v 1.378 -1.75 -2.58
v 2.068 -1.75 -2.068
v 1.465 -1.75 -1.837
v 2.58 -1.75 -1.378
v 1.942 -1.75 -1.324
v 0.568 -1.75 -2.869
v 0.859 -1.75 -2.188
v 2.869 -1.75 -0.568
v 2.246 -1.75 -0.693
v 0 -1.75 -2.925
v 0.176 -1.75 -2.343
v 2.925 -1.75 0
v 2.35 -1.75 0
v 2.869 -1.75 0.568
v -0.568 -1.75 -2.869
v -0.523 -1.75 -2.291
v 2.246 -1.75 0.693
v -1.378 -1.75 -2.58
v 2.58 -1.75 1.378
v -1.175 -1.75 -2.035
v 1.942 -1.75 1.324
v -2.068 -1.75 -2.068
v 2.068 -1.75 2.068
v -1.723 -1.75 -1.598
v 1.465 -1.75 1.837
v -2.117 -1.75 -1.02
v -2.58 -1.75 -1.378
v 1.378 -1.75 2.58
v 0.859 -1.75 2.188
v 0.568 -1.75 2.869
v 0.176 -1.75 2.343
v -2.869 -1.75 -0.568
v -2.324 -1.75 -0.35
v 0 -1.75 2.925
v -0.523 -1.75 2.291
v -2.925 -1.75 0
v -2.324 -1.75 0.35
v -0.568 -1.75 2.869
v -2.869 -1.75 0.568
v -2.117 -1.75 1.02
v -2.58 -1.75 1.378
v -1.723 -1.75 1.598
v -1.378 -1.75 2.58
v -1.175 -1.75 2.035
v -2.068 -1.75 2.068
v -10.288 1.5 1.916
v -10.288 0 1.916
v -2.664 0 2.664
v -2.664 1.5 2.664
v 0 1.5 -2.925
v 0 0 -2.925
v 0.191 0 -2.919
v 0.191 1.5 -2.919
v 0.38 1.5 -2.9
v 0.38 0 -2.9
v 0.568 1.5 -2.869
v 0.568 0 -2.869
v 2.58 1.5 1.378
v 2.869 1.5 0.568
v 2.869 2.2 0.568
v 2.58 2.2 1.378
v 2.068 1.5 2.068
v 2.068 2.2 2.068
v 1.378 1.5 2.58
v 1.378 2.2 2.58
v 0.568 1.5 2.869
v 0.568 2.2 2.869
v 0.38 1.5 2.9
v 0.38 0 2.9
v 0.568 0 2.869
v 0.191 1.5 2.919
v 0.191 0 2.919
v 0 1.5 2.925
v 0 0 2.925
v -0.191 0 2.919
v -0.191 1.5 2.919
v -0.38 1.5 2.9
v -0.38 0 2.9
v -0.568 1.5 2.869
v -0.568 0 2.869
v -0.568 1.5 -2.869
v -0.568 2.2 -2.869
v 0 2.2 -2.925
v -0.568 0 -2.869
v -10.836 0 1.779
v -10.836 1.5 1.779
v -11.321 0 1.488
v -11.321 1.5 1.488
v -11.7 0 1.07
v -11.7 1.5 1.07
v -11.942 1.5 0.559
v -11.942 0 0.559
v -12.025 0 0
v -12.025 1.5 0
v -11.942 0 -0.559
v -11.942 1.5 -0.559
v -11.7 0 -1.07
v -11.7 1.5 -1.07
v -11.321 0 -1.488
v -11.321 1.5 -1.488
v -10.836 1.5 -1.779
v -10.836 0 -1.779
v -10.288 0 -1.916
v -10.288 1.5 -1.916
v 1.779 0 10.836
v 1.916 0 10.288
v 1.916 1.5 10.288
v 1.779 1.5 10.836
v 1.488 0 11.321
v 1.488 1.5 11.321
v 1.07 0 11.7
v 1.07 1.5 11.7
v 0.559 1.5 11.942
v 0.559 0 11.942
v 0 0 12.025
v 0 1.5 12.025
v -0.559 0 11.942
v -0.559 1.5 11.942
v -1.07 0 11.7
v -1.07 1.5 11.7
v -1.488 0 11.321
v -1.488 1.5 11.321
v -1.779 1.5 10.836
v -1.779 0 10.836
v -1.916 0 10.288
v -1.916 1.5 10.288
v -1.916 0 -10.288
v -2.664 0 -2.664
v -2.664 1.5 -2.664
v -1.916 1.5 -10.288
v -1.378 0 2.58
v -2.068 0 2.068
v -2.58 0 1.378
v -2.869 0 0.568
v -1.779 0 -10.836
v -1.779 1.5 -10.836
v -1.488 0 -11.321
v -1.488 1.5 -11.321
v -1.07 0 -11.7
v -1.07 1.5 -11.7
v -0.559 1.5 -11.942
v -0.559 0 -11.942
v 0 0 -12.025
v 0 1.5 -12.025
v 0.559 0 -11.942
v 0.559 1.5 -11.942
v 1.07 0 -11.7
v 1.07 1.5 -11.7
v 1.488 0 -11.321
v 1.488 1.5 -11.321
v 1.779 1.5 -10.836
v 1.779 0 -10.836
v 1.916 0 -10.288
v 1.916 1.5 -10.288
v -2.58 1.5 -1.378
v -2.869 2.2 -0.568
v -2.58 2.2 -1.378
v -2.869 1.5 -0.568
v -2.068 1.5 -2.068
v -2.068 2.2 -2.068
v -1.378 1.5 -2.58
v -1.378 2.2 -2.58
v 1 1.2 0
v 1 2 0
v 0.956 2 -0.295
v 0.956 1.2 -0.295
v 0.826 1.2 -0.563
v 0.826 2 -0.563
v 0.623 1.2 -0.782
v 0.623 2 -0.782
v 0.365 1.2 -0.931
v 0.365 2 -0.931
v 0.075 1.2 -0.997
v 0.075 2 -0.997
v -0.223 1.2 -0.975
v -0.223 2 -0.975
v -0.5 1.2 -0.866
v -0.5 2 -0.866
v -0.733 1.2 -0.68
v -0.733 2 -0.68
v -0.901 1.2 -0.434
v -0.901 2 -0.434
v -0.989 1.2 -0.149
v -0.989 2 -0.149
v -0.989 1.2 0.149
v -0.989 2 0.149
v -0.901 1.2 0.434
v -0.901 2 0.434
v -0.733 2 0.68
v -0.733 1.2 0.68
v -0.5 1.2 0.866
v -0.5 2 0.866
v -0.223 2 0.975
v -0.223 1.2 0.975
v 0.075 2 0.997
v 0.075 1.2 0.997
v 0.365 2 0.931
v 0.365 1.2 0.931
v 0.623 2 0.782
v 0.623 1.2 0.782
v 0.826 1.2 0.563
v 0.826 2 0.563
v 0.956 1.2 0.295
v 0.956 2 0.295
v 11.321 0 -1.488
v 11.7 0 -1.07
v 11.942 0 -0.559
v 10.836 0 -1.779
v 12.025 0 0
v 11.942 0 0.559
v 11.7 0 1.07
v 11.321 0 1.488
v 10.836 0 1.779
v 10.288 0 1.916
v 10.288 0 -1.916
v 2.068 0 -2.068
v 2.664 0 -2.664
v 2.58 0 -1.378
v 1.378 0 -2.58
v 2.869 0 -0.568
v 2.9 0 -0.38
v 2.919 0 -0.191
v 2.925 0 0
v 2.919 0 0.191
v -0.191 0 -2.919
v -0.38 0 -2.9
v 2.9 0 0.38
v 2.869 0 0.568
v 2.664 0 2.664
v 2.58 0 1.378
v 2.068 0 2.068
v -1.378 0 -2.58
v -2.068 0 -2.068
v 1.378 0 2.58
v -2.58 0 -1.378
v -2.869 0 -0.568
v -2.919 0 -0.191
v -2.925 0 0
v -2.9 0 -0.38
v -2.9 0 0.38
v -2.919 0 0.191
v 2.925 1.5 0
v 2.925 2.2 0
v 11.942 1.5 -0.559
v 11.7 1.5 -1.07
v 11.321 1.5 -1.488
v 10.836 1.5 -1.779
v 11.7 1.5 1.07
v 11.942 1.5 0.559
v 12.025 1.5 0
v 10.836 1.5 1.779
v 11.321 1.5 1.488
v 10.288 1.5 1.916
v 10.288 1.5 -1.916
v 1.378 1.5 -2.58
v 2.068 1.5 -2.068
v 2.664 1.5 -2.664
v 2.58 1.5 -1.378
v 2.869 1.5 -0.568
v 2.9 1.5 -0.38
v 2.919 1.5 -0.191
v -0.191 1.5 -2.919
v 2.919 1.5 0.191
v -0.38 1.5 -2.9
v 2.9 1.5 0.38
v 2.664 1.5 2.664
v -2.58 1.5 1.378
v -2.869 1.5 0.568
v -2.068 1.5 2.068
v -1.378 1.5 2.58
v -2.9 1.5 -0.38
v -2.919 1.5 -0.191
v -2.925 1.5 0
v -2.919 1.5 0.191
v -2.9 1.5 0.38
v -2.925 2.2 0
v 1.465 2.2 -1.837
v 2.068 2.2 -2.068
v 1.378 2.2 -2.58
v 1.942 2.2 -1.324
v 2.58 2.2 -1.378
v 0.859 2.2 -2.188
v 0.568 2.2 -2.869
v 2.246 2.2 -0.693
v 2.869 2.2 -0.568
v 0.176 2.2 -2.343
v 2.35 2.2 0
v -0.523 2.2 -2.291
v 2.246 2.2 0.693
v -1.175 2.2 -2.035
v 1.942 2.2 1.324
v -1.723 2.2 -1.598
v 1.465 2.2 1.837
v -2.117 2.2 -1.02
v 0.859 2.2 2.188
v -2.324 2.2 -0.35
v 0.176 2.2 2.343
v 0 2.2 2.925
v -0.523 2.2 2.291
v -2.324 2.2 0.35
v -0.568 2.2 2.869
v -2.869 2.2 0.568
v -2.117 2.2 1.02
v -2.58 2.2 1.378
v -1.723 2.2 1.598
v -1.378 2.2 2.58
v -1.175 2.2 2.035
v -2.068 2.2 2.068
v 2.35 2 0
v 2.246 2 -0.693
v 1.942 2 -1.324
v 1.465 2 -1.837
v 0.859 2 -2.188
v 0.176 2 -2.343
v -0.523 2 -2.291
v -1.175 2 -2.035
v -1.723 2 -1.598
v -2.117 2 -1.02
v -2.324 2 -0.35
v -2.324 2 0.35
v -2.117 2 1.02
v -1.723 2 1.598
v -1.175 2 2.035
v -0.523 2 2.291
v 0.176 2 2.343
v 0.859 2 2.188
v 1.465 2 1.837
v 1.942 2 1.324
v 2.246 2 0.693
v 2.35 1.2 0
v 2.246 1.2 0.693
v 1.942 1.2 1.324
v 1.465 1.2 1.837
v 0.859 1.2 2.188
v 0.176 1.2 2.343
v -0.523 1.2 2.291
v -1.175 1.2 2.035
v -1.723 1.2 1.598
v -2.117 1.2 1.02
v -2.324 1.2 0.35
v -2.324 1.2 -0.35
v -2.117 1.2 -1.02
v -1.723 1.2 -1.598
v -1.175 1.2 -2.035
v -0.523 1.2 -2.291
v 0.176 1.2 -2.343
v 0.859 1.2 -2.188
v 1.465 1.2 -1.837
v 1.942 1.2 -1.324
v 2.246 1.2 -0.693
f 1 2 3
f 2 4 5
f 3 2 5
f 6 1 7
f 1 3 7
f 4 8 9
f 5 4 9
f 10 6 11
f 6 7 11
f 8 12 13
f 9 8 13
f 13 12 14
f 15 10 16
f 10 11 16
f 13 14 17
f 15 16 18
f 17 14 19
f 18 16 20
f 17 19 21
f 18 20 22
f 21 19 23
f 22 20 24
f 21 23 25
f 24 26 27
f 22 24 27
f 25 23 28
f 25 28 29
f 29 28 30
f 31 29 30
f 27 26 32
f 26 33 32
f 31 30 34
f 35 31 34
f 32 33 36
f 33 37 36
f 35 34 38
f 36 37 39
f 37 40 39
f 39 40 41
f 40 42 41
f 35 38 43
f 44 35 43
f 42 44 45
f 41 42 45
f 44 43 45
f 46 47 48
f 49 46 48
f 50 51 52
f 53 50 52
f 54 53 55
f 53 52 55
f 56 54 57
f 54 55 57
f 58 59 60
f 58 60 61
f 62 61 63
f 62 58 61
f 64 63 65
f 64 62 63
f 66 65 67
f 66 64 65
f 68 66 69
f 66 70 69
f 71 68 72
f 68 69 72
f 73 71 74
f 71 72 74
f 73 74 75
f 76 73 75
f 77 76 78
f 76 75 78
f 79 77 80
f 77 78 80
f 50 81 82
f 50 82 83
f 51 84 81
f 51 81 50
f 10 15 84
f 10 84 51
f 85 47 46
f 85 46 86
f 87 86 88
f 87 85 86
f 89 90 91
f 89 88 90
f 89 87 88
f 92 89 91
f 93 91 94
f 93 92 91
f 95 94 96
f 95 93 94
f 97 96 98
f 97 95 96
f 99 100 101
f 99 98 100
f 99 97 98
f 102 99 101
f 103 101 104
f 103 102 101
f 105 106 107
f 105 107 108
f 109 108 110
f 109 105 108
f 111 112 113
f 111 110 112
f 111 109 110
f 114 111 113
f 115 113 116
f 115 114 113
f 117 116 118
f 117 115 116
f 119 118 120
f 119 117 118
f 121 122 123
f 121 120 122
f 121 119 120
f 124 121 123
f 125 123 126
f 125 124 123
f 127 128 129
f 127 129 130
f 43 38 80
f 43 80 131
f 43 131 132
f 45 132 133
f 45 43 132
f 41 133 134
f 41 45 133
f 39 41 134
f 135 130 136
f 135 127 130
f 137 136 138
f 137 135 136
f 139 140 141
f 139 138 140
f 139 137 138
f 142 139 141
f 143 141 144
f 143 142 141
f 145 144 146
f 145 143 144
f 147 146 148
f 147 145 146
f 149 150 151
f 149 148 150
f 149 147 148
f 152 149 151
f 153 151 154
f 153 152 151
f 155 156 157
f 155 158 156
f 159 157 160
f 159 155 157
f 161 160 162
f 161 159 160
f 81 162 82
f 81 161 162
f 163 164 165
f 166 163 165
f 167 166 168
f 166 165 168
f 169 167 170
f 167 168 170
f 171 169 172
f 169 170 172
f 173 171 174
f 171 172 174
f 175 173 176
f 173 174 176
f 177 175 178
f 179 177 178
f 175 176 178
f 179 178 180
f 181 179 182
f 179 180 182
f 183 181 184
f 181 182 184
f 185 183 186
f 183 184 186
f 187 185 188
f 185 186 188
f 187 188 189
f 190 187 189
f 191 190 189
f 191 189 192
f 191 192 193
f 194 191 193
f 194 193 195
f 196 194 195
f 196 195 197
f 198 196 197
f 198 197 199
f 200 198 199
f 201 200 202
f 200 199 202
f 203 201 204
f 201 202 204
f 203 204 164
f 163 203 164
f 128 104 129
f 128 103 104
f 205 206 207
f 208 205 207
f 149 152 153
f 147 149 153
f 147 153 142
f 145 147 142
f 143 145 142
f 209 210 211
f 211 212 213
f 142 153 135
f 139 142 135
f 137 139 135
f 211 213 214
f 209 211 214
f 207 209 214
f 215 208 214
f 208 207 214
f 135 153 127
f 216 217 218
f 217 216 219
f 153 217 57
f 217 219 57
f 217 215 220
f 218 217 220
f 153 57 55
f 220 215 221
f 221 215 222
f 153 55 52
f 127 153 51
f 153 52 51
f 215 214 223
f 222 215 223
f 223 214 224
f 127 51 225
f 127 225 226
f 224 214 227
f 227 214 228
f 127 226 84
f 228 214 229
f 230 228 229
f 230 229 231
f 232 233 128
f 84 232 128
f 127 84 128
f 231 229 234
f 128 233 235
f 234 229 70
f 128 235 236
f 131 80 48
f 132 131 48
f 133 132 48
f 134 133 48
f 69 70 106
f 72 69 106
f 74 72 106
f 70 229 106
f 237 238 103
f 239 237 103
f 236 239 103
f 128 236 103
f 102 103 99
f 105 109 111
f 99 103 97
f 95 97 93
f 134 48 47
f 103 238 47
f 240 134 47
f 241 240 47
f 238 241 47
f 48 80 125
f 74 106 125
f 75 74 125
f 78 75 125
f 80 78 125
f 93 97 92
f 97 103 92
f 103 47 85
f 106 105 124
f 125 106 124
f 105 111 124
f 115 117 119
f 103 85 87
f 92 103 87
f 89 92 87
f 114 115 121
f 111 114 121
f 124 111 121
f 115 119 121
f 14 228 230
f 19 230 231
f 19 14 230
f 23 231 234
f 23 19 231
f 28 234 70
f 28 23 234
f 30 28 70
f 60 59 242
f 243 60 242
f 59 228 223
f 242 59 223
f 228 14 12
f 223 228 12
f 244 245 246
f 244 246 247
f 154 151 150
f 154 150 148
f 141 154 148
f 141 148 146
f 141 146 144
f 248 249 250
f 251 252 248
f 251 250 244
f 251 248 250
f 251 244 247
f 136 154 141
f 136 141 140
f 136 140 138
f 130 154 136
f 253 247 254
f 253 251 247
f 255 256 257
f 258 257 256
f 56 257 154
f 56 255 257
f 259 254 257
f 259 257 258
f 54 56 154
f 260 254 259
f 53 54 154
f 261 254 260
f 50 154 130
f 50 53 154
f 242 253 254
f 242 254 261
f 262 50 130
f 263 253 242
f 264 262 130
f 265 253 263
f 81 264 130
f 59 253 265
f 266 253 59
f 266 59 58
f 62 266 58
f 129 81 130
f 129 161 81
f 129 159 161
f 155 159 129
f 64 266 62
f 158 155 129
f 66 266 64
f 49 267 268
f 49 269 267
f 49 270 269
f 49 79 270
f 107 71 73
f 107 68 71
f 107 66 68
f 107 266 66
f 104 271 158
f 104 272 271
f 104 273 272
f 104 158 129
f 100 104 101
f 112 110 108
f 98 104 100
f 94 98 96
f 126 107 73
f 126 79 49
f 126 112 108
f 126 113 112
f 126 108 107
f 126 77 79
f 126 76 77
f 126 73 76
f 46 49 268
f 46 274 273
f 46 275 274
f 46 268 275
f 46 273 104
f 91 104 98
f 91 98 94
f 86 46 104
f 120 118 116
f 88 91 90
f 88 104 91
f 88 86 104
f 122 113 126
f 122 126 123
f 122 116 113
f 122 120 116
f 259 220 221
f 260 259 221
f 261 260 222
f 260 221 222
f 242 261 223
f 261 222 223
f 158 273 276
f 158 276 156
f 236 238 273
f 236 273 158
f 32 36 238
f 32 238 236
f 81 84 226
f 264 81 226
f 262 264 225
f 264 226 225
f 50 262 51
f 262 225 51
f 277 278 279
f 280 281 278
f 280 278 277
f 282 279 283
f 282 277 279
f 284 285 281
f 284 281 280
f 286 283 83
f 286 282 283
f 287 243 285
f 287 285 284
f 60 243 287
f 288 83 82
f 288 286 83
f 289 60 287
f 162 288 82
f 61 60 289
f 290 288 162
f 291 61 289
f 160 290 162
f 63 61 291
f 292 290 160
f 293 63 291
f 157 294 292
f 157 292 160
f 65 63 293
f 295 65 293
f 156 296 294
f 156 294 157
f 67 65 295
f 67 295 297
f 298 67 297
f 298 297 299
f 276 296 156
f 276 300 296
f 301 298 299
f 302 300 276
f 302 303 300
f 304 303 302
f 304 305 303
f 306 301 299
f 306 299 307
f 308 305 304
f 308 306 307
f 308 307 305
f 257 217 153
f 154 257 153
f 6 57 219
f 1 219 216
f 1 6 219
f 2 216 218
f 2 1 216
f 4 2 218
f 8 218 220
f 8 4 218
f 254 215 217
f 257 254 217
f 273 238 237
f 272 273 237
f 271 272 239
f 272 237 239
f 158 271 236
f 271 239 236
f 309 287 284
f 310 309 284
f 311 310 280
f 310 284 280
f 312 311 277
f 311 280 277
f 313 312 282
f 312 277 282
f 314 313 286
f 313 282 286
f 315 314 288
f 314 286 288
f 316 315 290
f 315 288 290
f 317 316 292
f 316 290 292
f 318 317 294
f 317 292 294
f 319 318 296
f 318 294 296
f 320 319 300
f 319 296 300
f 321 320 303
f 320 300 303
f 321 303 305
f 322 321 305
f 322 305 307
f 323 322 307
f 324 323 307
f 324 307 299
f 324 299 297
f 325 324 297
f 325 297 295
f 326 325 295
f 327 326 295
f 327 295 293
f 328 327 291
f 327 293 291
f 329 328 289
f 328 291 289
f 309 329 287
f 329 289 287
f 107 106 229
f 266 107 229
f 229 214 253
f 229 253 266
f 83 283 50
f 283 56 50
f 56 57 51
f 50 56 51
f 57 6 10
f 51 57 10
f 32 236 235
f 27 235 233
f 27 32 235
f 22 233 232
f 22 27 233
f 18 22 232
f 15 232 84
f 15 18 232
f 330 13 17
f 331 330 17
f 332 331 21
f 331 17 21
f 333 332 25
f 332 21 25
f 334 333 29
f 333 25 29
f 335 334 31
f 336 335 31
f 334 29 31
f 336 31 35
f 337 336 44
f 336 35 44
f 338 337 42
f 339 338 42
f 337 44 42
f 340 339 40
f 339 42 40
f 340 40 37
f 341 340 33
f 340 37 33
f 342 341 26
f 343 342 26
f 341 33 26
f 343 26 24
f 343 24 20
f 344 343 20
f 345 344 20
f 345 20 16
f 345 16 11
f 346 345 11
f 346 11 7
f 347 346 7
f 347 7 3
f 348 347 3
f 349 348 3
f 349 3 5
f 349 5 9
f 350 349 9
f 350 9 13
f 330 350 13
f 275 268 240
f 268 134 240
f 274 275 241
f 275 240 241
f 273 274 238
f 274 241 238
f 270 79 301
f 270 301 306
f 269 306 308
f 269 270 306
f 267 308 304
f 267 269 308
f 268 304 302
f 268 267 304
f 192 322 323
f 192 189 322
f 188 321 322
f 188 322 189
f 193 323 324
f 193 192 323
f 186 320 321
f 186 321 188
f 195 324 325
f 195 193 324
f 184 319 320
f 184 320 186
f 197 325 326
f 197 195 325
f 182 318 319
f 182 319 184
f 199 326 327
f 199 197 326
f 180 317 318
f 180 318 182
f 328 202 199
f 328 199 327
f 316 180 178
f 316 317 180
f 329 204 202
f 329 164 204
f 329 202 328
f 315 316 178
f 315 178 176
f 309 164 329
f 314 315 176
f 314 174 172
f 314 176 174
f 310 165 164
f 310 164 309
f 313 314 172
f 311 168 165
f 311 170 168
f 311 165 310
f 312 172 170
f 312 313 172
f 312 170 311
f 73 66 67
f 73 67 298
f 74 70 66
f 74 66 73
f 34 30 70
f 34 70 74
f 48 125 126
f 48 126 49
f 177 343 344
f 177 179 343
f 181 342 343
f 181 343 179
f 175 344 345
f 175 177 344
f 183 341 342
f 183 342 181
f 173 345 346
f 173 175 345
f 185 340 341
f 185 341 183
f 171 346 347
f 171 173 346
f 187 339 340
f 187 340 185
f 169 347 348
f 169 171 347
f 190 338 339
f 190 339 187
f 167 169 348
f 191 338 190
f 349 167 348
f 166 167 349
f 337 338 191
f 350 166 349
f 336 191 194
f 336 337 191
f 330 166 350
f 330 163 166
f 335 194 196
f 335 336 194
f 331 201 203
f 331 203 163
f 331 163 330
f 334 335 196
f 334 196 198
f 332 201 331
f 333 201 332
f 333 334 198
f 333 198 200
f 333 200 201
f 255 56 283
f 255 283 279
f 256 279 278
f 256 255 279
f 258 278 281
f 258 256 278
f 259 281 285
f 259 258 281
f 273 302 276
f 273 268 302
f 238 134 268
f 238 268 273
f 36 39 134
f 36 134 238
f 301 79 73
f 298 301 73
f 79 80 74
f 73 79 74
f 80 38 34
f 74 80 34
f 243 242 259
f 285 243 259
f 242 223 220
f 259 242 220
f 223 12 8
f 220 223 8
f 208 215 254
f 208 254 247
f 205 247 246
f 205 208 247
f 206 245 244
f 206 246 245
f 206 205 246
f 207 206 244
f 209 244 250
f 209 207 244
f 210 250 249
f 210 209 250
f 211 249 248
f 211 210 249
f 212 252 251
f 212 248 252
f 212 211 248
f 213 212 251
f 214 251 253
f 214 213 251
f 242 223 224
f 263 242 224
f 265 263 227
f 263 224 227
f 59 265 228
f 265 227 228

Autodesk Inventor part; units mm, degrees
ref_plane "YZ Plane" through (0, 0, 0) normal (1, 0, 0) x (0, 1, 0)
ref_plane "XZ Plane" through (0, 0, 0) normal (0, 1, 0) x (-1, 0, 0)
ref_plane "XY Plane" through (0, 0, 0) normal (0, 0, 1) x (1, 0, 0)
sketch "Sketch1" plane through (0, 0, 0) normal (0, 1, 0) x (-1, 0, 0)
  circle A0 centre (0, 0) radius 2.925
  line L0 (0, 10.1) -> (0, -10.1) construction
  arc A1 (1.9158, 10.2879) -> (-1.9158, 10.2879) centre (0, 10.1) ccw
  arc A2 (-1.9158, -10.2879) -> (1.9158, -10.2879) centre (0, -10.1) ccw
  line L1 (10.1, 0) -> (-10.1, 0) construction
  arc A3 (10.2879, -1.9158) -> (10.2879, 1.9158) centre (10.1, 0) ccw
  arc A4 (-10.2879, 1.9158) -> (-10.2879, -1.9158) centre (-10.1, 0) ccw
  line L2 (1.9158, 10.2879) -> (2.925, 0)
  line L3 (-1.9158, 10.2879) -> (-2.925, 0)
  line L4 (-2.925, 0) -> (-1.9158, -10.2879)
  line L5 (2.925, 0) -> (1.9158, -10.2879)
  line L6 (10.2879, 1.9158) -> (0, 2.925)
  line L7 (10.2879, -1.9158) -> (0, -2.925)
  line L8 (-10.2879, 1.9158) -> (0, 2.925)
  line L9 (-10.2879, -1.9158) -> (0, -2.925)
  point P0 (2.6637, 2.6637)
  point P1 (-2.6637, 2.6637)
  point P2 (-2.6637, -2.6637)
  point P3 (2.6637, -2.6637)
  point P4 (-0.5684, -2.8692)
  point P5 (0.5684, -2.8692)
  point P6 (2.8692, -0.5684)
  point P7 (2.8692, 0.5684)
  point P8 (0.5684, 2.8692)
  point P9 (-0.5684, 2.8692)
  point P10 (-2.8692, 0.5684)
  point P11 (-2.8692, -0.5684)
  dimension "d0" = 5.85
  dimension "d1" = 20.2
  dimension "d2" = 3.85
  dimension "d3" = 3.85
  dimension "d4" = 20.2
extrude "Extrusion1" add sketch "Sketch1" along normal blind 1.5 contours A0 L2 L6 A3 L7 L5 | A0 L6 L2 | L5 L7 A0 | A0 L8 L3 A1 L2 L6 | L7 L5 A2 L4 L9 A0 | A0 L3 L8 | L9 L4 A0 | A0 L4 L9 A4 L8 L3
extrude "Extrusion2" add sketch "Sketch1" along normal blind 2.2 and the other way blind 1.75 contours L5 A0 L7 L9 L4 L3 L8 L6 L2
sketch "Sketch2" plane through (0, -1.75, 0) normal (0, -1, 0) x (1, 0, 0)
  circle A0 centre (0, 0) radius 2.35
  dimension "d14" = 4.7
extrude "Extrusion3" cut sketch "Sketch2" against normal blind 2.95
sketch "Sketch3" plane through (0, 2.2, 0) normal (0, 1, 0) x (1, 0, 0)
  circle A0 centre (0, 0) radius 1
  dimension "d17" = 2
extrude "Extrusion4" cut sketch "Sketch3" against normal blind 2.95
sketch "Sketch4" plane through (0, 2.2, 0) normal (0, 1, 0) x (1, 0, 0)
  circle A0 centre (0, 0) radius 1 projected
  circle A1 centre (0, 0) radius 2.35
  dimension "d20" = 4.7
extrude "Extrusion5" cut sketch "Sketch4" against normal blind 0.2 contours A0 | A1
properties part number "helice_cruz_mockup"
